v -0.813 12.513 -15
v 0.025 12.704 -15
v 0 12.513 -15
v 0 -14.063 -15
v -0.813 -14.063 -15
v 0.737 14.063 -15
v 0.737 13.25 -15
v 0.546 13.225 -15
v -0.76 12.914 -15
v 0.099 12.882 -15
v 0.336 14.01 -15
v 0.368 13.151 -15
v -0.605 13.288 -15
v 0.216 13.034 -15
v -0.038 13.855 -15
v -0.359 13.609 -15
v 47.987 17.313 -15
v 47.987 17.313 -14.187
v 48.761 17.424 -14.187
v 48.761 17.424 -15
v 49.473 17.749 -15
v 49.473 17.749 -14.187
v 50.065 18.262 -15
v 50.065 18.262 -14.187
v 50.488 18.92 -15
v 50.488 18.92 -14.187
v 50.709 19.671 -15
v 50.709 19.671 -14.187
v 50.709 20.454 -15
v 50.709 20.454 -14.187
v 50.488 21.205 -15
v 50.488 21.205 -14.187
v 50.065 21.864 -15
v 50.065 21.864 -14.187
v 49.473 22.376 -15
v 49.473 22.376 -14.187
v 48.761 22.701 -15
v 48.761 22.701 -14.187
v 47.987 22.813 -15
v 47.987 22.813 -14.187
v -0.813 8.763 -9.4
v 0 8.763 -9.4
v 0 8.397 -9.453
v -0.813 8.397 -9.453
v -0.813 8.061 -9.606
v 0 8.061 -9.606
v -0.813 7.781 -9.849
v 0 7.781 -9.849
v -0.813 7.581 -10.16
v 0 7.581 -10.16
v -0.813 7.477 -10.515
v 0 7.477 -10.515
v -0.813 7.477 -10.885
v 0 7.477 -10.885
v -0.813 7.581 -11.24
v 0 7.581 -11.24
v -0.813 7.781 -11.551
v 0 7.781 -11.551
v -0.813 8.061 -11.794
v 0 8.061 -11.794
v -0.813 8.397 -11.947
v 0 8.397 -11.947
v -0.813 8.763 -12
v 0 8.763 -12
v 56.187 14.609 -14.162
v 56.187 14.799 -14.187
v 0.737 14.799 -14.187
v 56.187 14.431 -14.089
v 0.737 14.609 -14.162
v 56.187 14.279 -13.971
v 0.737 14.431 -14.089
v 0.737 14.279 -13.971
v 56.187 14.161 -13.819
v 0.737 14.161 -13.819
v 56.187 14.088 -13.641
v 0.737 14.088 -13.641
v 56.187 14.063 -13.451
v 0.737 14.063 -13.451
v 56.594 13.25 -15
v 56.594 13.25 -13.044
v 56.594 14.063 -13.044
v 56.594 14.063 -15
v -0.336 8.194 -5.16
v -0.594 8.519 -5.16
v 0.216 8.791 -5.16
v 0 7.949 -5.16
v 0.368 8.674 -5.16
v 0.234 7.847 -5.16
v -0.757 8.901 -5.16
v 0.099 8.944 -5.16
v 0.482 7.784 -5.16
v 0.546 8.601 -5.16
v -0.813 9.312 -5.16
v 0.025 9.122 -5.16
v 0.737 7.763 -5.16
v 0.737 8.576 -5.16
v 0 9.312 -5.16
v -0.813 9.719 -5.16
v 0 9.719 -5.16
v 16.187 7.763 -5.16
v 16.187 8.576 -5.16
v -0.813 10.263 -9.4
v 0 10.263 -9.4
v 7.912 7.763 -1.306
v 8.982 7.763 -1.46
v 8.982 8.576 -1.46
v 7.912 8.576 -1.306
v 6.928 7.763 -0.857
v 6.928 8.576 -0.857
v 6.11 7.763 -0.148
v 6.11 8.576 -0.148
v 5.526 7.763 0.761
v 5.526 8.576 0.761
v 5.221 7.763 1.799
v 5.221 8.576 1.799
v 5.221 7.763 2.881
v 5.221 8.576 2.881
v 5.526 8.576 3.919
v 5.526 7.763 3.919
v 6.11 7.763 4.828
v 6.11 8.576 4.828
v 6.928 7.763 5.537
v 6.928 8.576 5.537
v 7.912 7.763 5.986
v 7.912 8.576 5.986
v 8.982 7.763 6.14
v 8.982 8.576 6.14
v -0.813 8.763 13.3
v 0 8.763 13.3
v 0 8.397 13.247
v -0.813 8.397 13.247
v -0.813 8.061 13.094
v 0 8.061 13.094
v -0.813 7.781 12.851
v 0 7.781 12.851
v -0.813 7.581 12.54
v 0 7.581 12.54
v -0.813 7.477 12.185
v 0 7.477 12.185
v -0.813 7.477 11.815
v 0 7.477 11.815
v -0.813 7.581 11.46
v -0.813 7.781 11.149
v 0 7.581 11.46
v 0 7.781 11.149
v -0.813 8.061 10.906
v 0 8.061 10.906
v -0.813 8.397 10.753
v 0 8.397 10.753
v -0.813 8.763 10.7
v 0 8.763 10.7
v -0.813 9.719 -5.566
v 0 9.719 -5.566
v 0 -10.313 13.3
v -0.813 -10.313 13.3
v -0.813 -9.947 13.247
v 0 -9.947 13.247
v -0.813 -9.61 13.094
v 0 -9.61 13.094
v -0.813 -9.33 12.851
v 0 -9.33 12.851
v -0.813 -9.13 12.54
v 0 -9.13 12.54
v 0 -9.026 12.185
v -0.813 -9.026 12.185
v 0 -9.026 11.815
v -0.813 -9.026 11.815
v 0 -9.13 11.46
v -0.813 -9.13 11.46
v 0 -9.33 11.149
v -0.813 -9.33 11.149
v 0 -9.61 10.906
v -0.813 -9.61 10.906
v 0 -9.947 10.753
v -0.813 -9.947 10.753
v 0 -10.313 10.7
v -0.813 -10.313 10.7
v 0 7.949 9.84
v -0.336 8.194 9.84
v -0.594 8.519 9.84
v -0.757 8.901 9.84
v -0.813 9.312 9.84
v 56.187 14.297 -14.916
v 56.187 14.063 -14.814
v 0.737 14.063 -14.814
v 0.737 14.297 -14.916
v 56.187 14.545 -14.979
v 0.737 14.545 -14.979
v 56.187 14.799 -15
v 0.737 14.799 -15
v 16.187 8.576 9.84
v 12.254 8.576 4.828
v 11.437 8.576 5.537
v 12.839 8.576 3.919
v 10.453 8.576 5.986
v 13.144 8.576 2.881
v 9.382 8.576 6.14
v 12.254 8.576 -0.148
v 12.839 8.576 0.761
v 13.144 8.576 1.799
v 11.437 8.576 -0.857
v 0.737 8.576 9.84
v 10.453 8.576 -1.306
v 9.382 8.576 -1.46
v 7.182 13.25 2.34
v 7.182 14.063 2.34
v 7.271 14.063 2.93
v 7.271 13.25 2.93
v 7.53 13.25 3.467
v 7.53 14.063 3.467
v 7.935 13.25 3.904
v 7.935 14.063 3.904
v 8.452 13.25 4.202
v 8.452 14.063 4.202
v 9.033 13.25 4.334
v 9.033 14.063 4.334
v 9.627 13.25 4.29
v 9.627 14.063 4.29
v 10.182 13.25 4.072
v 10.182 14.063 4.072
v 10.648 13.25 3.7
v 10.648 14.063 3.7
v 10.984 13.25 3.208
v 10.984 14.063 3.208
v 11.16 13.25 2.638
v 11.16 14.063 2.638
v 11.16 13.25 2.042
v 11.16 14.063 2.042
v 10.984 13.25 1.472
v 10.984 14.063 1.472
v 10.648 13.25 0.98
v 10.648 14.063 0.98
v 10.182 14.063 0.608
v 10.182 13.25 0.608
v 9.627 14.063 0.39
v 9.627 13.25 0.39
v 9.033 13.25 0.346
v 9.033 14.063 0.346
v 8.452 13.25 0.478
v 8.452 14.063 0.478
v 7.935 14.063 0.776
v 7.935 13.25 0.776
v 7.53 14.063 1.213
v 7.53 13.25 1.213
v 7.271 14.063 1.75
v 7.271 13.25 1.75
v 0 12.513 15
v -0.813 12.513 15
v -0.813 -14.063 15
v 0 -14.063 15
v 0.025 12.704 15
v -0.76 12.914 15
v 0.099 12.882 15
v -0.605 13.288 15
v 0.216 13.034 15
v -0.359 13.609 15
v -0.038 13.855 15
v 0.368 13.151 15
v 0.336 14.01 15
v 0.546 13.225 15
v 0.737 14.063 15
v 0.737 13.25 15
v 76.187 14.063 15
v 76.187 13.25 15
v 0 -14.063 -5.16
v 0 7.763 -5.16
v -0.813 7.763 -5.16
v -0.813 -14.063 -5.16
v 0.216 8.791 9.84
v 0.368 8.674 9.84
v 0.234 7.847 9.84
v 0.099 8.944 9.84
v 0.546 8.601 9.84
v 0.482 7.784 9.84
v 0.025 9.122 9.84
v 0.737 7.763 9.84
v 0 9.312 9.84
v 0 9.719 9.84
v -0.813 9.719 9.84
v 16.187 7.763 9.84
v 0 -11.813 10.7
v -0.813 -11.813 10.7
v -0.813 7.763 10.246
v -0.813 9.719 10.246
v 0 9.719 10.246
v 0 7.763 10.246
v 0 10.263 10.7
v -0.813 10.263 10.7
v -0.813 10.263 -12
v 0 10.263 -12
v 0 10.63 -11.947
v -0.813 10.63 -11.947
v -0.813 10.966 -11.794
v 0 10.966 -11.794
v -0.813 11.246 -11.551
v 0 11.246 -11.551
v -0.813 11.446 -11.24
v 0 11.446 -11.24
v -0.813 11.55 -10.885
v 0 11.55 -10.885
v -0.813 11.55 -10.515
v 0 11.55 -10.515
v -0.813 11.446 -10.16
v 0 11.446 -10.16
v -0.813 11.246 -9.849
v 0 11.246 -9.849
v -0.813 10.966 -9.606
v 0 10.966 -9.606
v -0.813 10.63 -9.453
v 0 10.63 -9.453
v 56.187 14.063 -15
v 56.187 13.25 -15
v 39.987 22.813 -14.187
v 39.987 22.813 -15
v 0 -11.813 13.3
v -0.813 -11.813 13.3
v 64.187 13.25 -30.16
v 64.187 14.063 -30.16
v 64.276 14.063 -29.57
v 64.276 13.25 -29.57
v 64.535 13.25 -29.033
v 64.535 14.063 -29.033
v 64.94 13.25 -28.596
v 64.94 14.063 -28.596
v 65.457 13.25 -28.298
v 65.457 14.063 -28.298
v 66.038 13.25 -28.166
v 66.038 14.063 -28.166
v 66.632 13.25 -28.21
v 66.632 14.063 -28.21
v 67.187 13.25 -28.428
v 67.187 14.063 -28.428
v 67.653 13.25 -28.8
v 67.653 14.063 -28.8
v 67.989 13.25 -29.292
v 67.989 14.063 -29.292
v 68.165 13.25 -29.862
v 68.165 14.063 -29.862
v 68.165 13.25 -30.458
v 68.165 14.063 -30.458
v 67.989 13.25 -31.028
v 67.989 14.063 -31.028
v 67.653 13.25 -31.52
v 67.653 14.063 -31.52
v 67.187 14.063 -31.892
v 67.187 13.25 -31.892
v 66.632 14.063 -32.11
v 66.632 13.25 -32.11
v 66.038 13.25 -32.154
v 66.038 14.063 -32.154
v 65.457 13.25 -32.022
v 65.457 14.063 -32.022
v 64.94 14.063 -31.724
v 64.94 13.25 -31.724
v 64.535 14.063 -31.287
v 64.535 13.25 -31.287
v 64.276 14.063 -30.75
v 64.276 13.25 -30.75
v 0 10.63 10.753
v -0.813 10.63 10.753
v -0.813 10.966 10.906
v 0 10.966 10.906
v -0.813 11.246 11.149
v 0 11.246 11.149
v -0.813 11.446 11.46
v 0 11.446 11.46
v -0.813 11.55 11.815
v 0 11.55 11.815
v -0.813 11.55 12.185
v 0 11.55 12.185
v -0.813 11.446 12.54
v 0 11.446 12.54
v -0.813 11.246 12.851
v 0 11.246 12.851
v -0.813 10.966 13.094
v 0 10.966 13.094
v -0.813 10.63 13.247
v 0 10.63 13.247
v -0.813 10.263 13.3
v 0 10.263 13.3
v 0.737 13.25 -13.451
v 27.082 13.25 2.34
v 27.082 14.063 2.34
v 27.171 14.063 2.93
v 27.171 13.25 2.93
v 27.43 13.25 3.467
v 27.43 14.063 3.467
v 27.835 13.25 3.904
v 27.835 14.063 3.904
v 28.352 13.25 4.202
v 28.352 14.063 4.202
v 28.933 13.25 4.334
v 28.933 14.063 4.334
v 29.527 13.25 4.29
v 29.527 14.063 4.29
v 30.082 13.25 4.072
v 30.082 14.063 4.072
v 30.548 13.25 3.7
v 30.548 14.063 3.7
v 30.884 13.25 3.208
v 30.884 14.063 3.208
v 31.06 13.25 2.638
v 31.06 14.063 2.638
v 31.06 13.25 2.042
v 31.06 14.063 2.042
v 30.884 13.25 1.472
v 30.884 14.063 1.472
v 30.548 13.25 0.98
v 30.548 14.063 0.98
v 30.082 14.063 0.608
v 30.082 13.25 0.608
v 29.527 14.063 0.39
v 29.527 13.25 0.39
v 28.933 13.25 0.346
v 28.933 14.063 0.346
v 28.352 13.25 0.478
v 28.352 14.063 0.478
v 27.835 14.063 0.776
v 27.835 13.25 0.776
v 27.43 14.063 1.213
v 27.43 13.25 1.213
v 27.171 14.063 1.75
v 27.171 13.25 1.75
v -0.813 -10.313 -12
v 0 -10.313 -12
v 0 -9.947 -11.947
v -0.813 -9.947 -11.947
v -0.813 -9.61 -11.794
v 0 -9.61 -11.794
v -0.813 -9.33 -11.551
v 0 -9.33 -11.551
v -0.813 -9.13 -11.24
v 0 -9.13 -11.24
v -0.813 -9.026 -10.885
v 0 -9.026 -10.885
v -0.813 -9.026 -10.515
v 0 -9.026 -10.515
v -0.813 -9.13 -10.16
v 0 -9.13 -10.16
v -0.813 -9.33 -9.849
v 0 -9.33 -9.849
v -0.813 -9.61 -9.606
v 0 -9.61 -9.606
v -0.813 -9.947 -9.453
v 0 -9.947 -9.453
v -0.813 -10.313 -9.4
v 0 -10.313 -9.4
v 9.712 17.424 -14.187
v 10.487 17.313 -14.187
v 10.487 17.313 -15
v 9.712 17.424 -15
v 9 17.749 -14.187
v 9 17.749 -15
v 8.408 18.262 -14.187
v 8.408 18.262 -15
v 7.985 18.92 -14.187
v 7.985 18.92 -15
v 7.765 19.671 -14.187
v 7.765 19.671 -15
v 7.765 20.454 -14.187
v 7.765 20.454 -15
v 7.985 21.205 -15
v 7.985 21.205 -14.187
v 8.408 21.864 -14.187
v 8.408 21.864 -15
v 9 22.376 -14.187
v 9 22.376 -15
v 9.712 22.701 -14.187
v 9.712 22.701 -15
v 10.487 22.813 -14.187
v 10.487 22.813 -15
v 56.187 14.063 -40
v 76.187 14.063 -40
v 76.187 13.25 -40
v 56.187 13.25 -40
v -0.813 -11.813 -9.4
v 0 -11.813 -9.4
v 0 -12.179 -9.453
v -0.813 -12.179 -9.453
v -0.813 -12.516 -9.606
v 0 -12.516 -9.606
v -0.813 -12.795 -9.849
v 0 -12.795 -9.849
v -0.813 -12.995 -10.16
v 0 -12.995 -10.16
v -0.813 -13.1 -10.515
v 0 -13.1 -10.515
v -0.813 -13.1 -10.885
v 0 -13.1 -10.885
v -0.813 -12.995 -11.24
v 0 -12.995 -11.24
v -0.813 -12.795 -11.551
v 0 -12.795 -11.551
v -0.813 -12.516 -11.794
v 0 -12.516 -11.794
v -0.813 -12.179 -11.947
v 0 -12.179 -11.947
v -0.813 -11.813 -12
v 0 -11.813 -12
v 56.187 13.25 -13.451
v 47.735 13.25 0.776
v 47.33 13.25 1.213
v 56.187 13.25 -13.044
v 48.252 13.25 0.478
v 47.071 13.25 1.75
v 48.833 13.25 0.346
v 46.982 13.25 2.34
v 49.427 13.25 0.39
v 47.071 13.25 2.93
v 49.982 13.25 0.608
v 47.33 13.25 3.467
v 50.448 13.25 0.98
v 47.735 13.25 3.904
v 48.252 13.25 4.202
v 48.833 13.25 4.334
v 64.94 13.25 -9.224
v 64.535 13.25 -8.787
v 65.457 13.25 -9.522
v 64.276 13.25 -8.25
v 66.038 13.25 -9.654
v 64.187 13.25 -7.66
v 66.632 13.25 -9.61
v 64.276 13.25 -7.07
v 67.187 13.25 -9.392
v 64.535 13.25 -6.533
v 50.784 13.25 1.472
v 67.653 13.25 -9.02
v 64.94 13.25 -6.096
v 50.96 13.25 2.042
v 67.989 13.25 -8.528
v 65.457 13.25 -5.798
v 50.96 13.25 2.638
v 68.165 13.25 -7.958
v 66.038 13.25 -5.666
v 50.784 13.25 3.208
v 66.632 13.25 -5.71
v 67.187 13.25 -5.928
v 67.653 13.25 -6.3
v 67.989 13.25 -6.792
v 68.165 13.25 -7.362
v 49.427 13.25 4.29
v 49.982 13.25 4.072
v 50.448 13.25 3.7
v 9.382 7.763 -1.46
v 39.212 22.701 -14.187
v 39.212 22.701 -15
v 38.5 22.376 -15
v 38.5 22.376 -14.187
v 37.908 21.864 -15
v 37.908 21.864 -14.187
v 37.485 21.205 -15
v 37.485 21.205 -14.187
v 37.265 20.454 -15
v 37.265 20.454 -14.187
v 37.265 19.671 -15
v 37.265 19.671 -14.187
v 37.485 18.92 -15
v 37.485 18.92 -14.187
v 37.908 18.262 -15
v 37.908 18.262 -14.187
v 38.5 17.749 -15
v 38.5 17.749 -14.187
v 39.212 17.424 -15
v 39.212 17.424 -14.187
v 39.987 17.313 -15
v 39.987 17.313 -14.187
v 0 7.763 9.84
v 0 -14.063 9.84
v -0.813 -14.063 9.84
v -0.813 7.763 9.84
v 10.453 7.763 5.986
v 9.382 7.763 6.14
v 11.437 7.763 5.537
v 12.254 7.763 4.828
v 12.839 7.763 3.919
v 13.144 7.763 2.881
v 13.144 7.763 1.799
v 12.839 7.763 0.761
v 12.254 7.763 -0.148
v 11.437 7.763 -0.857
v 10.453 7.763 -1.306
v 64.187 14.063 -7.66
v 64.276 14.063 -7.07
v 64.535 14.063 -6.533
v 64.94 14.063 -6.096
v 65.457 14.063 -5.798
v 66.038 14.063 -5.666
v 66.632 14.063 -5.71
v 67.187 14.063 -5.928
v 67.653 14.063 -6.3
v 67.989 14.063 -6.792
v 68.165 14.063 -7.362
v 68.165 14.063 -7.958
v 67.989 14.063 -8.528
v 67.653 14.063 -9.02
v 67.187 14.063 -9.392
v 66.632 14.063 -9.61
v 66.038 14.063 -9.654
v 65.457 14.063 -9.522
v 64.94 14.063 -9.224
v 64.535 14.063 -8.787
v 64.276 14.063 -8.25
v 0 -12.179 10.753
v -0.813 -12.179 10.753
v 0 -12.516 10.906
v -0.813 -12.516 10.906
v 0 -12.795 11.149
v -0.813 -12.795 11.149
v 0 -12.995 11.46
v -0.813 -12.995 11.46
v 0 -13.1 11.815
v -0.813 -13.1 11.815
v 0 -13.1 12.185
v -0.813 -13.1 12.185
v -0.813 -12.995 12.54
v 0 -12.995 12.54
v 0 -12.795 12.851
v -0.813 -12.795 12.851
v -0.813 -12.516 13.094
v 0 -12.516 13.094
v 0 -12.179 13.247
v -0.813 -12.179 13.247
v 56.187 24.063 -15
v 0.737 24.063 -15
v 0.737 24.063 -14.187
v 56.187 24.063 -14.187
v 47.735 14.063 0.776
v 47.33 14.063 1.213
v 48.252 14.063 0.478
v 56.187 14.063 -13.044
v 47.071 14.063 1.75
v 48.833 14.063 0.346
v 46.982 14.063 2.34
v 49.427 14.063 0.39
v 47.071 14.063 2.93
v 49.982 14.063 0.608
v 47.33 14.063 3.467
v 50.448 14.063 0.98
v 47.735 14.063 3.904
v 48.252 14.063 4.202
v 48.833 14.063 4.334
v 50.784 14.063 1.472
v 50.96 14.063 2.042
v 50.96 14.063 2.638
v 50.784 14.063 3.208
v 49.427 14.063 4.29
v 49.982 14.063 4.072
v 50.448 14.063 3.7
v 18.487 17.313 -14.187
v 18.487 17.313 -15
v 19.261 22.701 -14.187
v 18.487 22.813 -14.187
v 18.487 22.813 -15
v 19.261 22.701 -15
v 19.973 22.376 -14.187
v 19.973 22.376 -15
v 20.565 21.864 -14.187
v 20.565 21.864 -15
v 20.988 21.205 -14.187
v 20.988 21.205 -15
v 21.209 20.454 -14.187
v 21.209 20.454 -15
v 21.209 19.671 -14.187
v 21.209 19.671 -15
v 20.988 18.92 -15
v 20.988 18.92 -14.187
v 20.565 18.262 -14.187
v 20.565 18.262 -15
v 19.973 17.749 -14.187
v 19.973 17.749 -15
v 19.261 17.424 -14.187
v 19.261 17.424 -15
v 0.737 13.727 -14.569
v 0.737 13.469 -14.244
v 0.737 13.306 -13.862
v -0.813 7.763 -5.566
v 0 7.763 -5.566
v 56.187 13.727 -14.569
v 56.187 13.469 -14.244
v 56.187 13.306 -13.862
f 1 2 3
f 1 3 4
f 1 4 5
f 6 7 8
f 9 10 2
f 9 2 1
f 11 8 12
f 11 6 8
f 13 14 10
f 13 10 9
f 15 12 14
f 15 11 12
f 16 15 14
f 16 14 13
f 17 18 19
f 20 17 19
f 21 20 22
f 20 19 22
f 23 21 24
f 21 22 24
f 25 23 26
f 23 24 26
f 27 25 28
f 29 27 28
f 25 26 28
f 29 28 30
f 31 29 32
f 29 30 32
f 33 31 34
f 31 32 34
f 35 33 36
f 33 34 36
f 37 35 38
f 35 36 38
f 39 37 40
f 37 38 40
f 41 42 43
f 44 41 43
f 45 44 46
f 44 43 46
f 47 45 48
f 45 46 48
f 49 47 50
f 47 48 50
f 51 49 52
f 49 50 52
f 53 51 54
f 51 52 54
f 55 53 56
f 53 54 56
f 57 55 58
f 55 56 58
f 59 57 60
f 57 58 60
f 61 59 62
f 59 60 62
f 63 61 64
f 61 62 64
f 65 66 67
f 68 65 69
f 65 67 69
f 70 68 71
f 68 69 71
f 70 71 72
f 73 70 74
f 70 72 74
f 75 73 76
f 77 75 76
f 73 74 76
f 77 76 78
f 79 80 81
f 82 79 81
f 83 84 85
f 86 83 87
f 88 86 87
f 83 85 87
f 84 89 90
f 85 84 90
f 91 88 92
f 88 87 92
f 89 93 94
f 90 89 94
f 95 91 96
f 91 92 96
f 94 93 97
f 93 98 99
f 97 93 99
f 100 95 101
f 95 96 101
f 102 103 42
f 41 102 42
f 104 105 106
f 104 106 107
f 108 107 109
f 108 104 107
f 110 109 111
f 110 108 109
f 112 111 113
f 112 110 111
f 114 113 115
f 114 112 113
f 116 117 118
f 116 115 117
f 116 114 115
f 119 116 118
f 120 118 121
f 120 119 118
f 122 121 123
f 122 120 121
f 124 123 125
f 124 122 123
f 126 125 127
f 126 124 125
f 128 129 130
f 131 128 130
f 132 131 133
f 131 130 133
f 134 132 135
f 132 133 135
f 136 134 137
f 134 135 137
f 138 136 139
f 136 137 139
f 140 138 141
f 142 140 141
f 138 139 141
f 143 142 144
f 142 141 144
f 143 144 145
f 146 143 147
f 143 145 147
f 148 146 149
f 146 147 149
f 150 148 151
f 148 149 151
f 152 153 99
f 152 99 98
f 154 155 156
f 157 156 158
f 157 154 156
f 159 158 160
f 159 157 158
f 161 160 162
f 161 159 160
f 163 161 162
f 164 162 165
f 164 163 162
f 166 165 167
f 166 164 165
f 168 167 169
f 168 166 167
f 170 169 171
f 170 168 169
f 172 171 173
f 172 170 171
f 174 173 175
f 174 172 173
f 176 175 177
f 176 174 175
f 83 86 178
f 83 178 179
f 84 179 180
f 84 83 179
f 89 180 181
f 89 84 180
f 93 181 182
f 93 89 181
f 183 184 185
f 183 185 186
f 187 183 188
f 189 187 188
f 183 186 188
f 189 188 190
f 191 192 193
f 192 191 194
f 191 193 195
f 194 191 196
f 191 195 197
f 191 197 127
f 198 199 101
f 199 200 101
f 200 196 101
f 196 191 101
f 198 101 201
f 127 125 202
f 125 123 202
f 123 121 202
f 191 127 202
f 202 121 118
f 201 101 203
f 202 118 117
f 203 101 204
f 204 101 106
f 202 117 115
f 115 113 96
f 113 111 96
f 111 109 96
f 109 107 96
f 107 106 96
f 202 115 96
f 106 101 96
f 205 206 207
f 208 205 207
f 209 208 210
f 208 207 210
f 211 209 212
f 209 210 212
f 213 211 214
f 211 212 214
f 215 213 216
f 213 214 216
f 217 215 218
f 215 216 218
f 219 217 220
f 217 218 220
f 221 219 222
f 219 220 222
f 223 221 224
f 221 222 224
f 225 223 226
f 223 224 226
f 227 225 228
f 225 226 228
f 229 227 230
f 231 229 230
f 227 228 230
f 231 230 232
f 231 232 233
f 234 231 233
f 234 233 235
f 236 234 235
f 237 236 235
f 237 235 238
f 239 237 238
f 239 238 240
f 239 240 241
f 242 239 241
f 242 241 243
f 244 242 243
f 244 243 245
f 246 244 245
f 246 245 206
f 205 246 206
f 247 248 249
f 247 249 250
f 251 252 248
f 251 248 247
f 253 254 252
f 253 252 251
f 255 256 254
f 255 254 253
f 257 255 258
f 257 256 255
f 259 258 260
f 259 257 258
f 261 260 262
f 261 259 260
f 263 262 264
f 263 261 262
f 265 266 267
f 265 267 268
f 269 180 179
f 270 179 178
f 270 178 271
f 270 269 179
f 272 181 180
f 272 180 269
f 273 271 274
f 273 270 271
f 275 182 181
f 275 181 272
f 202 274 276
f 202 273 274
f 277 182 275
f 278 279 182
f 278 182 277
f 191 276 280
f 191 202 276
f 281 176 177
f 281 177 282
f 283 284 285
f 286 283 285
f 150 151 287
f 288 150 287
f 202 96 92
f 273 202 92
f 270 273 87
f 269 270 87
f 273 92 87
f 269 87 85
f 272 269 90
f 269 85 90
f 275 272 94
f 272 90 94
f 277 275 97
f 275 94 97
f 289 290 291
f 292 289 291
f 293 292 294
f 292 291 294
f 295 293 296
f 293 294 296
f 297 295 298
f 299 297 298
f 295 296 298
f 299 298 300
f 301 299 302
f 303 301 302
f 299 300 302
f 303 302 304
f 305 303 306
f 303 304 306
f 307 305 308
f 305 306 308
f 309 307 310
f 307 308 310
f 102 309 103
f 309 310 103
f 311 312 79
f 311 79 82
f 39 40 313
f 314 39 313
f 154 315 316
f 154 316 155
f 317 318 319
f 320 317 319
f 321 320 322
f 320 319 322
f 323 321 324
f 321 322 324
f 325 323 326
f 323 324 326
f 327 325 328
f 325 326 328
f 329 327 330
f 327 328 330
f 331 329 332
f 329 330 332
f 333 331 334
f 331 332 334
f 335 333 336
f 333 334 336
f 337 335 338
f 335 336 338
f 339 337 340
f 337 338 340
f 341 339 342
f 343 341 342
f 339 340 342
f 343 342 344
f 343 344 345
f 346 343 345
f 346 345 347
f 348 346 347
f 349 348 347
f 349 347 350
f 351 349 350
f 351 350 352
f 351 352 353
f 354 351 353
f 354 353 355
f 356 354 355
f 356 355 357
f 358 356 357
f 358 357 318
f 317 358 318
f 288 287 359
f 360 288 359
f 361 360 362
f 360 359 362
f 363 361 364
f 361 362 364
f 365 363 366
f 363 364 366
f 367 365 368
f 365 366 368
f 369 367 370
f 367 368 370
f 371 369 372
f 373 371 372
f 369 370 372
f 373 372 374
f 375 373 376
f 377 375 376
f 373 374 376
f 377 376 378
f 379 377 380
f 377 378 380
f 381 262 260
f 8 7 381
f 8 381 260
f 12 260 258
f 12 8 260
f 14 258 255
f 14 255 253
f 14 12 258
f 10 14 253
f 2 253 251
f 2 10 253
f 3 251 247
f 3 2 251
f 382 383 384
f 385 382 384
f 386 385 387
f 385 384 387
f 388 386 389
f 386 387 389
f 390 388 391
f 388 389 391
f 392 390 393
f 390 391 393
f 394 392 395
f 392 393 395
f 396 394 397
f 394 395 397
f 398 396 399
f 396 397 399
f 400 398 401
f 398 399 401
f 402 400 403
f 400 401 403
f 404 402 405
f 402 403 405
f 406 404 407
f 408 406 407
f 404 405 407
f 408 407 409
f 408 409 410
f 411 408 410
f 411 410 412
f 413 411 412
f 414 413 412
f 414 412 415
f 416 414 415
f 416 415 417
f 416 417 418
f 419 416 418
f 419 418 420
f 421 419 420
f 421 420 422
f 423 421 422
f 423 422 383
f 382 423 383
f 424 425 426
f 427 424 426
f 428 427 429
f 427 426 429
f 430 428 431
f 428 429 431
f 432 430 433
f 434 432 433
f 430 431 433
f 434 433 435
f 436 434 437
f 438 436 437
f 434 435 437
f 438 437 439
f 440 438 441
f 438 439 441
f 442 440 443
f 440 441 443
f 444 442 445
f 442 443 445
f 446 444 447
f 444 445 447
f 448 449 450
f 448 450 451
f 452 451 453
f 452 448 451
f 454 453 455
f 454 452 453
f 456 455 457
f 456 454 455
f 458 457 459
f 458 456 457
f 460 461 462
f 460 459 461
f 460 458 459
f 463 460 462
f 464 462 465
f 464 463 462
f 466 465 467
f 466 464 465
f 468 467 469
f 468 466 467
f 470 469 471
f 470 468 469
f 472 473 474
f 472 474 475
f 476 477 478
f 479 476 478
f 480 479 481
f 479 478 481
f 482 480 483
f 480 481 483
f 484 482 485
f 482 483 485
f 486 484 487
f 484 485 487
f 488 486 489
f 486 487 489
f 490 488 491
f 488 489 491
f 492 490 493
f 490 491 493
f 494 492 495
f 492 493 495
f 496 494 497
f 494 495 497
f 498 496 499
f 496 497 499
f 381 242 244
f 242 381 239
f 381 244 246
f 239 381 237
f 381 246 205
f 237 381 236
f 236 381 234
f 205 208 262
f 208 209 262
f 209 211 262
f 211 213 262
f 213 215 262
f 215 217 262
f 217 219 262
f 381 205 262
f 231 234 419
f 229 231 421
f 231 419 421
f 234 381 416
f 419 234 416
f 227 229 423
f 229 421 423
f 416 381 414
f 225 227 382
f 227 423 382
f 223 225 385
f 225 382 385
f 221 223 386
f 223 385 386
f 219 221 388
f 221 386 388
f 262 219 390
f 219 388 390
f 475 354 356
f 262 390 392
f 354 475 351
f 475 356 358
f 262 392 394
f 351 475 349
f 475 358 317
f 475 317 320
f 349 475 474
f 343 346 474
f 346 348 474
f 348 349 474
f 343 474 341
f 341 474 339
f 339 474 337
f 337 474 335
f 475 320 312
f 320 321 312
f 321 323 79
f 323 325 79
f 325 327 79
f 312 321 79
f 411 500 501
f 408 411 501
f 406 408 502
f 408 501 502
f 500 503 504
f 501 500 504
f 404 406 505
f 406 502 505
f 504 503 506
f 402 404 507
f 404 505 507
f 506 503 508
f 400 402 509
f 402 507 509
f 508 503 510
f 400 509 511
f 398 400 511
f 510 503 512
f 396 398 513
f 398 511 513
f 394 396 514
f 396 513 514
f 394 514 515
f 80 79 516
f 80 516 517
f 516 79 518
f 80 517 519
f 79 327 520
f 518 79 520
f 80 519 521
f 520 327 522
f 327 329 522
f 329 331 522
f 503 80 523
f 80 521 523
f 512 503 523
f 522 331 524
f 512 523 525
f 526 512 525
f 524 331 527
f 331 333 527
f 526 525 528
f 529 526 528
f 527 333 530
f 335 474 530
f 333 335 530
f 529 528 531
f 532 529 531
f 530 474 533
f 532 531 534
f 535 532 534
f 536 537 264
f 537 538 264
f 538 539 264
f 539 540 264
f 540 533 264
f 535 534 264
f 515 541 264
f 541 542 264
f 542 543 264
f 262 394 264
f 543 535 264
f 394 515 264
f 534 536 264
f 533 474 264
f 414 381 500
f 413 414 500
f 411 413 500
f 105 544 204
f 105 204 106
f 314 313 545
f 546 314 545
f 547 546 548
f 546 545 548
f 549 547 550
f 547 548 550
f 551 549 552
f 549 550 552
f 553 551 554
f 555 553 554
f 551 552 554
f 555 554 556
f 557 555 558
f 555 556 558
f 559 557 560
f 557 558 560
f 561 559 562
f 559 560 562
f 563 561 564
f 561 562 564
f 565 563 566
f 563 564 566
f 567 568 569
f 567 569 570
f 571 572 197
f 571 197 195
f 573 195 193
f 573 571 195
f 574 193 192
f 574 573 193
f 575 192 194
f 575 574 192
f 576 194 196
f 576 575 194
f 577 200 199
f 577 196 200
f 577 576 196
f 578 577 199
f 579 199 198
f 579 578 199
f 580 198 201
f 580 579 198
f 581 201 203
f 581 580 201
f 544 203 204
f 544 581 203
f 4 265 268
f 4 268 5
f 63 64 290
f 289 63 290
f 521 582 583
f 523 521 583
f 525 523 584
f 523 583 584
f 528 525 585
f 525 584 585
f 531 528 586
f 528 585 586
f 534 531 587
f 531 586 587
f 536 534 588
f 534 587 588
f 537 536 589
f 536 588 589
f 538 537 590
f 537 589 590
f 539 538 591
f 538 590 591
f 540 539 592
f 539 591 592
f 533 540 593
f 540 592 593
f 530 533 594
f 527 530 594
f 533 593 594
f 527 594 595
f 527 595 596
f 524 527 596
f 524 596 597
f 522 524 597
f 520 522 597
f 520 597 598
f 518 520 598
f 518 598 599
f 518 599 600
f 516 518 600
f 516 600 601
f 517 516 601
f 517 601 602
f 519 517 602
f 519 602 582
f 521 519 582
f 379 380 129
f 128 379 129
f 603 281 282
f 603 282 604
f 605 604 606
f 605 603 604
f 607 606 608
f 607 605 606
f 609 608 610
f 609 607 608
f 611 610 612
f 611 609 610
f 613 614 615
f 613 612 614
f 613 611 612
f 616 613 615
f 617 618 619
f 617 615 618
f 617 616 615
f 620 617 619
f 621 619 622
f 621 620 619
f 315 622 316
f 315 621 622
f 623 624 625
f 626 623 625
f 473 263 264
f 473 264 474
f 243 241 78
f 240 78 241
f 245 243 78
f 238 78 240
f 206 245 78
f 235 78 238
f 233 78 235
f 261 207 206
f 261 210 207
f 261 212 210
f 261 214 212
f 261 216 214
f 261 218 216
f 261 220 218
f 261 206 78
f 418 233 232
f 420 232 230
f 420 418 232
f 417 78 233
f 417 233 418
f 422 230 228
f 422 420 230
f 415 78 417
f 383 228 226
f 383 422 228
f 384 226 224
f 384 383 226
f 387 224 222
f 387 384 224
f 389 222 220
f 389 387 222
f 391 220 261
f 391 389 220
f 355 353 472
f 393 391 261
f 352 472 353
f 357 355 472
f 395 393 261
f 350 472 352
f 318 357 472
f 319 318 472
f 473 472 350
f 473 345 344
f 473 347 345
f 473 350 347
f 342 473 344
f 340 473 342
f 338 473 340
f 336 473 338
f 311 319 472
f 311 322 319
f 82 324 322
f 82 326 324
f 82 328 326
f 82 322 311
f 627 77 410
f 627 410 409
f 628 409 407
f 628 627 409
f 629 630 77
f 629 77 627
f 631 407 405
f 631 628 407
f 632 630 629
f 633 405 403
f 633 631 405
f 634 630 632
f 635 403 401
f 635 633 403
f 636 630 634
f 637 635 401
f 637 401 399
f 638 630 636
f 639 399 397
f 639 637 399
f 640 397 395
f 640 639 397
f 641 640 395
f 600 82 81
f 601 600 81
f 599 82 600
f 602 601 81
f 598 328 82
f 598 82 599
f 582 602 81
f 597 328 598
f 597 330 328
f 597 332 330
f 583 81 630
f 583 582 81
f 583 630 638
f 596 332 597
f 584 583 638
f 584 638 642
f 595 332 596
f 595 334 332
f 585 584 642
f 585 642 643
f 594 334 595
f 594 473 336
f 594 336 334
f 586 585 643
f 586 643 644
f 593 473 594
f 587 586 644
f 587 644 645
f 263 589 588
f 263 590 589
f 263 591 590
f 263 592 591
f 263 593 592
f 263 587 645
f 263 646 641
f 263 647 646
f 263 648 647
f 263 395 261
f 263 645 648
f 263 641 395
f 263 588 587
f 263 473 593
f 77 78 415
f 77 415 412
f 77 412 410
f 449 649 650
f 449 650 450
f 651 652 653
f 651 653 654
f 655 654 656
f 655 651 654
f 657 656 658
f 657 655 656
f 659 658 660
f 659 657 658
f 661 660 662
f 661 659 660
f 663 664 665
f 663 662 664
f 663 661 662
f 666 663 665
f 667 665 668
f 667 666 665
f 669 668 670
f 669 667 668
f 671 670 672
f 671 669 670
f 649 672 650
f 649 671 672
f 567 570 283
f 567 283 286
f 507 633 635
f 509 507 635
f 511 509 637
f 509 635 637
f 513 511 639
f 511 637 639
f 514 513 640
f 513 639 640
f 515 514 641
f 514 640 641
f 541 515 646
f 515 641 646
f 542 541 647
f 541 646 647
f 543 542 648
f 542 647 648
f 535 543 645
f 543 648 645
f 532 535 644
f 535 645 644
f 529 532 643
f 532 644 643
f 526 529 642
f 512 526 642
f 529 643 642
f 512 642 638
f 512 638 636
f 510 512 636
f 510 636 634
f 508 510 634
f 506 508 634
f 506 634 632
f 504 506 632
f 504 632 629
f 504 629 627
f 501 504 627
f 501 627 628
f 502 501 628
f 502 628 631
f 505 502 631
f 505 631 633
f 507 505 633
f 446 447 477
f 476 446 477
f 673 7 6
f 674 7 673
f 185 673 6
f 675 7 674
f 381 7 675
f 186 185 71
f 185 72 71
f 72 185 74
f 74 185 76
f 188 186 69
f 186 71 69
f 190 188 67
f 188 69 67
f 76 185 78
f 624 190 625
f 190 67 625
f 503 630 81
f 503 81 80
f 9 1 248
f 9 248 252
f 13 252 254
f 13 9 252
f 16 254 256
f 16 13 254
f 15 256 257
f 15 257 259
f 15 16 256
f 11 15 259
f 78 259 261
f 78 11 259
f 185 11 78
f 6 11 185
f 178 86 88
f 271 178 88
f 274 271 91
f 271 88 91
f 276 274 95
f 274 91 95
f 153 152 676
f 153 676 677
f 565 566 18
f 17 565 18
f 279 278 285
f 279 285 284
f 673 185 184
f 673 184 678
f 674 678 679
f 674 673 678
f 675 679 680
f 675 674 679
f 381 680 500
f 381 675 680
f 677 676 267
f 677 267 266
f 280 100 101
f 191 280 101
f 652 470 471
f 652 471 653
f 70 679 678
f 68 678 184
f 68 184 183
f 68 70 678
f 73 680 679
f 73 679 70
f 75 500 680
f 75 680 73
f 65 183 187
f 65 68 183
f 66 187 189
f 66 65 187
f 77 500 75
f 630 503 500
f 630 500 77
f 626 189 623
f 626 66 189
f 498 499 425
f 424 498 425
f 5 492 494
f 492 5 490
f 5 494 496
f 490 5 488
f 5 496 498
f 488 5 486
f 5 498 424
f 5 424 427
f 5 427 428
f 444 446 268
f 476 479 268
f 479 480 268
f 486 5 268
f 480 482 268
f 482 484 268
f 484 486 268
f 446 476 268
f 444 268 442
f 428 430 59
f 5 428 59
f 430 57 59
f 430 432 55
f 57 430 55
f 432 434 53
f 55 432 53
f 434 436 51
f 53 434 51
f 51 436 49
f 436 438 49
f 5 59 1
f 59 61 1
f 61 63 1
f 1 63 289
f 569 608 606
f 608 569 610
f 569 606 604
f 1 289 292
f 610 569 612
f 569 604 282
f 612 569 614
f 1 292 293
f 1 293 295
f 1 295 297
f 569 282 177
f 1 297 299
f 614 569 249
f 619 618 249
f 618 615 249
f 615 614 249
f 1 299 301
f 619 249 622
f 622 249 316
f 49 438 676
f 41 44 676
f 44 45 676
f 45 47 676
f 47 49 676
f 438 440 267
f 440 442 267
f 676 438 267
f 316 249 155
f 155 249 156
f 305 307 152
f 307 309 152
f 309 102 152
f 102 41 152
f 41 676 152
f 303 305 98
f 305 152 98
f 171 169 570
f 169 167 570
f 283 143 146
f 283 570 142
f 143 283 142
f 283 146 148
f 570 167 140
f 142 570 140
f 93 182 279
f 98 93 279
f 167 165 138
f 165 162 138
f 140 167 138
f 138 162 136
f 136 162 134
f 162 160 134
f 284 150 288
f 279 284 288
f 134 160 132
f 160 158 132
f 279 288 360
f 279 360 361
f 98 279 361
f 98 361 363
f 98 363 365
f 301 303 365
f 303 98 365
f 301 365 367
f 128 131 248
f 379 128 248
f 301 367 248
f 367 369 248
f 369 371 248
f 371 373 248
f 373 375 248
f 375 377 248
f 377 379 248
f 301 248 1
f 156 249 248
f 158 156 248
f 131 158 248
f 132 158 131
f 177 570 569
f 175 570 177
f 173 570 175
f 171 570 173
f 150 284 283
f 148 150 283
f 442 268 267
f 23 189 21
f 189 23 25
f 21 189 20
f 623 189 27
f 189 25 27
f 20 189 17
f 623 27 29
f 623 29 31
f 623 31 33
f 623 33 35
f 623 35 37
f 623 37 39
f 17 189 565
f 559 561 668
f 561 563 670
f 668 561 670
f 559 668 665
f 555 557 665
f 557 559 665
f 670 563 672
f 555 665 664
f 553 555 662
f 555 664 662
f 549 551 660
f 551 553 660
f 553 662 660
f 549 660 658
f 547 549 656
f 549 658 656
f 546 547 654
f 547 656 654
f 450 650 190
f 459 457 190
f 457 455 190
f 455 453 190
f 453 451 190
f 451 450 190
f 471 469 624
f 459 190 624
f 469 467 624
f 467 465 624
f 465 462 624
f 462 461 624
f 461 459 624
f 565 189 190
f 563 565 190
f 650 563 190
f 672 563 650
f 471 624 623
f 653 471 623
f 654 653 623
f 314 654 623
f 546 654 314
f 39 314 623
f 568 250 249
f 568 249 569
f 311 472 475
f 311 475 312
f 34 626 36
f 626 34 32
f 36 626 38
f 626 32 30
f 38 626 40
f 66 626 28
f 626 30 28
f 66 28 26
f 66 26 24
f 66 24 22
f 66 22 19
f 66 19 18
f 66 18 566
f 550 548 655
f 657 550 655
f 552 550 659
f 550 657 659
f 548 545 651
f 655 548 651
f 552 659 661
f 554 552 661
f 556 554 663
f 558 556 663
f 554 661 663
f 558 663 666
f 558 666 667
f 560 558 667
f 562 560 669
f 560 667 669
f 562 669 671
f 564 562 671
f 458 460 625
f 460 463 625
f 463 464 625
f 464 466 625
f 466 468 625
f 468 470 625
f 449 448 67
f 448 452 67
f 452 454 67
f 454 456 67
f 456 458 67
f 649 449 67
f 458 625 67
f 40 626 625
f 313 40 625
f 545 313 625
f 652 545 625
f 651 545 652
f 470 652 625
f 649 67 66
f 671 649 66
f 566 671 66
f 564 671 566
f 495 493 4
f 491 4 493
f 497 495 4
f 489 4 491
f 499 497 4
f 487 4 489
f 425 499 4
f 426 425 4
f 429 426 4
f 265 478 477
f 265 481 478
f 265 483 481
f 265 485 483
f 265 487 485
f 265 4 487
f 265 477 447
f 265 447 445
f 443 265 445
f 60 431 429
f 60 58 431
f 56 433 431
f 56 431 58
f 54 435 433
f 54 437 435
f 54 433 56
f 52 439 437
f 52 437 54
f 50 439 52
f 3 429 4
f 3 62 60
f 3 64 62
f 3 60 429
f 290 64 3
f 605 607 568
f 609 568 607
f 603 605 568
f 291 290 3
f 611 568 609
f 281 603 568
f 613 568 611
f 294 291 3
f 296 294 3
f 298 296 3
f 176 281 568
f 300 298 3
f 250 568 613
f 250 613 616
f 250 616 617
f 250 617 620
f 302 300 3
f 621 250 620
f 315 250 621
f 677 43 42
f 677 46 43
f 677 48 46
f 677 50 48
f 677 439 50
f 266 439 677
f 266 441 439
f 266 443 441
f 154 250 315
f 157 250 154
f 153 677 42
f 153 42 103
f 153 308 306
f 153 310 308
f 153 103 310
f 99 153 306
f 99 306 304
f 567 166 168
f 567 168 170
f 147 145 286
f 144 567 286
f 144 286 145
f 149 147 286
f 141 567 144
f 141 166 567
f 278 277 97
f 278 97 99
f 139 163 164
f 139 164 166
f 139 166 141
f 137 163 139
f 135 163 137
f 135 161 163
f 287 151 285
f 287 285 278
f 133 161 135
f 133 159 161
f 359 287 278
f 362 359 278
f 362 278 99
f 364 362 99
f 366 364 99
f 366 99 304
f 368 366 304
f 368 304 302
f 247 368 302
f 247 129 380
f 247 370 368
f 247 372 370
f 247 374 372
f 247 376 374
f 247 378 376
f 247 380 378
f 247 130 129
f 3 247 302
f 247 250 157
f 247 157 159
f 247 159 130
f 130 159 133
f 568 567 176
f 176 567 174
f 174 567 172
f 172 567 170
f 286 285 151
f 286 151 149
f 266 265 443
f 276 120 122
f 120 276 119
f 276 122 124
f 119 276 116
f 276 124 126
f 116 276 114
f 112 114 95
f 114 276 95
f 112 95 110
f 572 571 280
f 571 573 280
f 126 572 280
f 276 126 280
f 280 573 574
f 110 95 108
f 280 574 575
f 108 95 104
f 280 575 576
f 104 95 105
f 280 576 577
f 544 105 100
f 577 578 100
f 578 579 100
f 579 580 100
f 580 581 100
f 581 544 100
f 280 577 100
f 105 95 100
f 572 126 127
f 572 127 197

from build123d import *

# Parameters (mm, degrees)
BASE_FLANGE2_DEPTH           = 0.8128
EDGE_FLANGE1_STRIP_W         = 4.7244
EDGE_FLANGE1_STRIP_H         = 0.8128
EDGE_FLANGE1_STRIP_CUT_DEPTH = 30
EDGE_FLANGE1_DEPTH           = 30
EDGE_FLANGE1_FLAT_DEPTH      = 0.8128
EDGE_FLANGE3_START           = 0.7366
EDGE_FLANGE3_DEPTH           = 55.857
EDGE_FLANGE3_START_2         = 56.1872
EDGE_FLANGE3_2_DEPTH         = 0.4064
EDGE_FLANGE3_3_DEPTH         = 55.4506
CUT_EXTRUDE1_REACH           = 92.529
SKETCH21_R                   = 2
CUT_EXTRUDE2_REACH           = 87.061
EDGE_FLANGE4_START           = -5.5664
EDGE_FLANGE4_DEPTH           = 15.8128
EDGE_FLANGE4_2_DEPTH         = 0.4064
EDGE_FLANGE4_START_2         = 9.84
EDGE_FLANGE4_3_DEPTH         = 0.4064
EDGE_FLANGE4_START_3         = -5.16
EDGE_FLANGE4_4_DEPTH         = 15
CUT_EXTRUDE3_REACH           = 90.774
CUT_EXTRUDE4_REACH           = 91.35


# Read off the part's stored shape, not the designer's step: Edge-Flange3, Edge-Flange4
# Sheet-metal steps are written as plain solids
with BuildPart() as part:
    # Sketch7 → Base-Flange2 (new body)
    with BuildSketch(Plane.YZ):
        Polygon((-14.0628, 9.84), (7.7628, 9.84), (7.7628, -5.16), (-14.0628, -5.16), (-14.0628, -15), (14.0628, -15), (14.0628, 15), (-14.0628, 15), align=None)
    extrude(amount=-BASE_FLANGE2_DEPTH)

    # Edge-Flange1 strip (across the edge) → Edge-Flange1 strip cut (cut)
    with BuildSketch(Plane(origin=(0, 14.0628, -15), x_dir=(0, -1, 0), z_dir=(0, 0, 1))):
        with Locations((-0.8128, -0.4064)):
            Rectangle(EDGE_FLANGE1_STRIP_W, EDGE_FLANGE1_STRIP_H)
    extrude(amount=EDGE_FLANGE1_STRIP_CUT_DEPTH, mode=Mode.SUBTRACT)

    # Edge-Flange1 bend section (across the edge) → Edge-Flange1 (add)
    with BuildSketch(Plane(origin=(0, 14.0628, -15), x_dir=(0, -1, 0), z_dir=(0, 0, 1))):
        with BuildLine():
            Line((0, 0.7366), (0.8128, 0.7366))
            ThreePointArc((0.8128, 0.7366), (1.028545145, 0.215745145), (1.5494, 0))
            Line((1.5494, 0), (1.5494, -0.8128))
            ThreePointArc((1.5494, -0.8128), (0.453808753, -0.358991247), (0, 0.7366))
        make_face()
    extrude(amount=EDGE_FLANGE1_DEPTH)

    # Edge-Flange1 profile (on flange) → Edge-Flange1 flat (add)
    with BuildSketch(Plane.ZX.offset(14.0628)):
        Polygon((-40, 56.1872), (-15, 56.1872), (-15, 0.7366), (15, 0.7366), (15, 76.1872), (-40, 76.1872), align=None)
    extrude(amount=-EDGE_FLANGE1_FLAT_DEPTH)

    # Edge-Flange3 outline → Edge-Flange3 (cut)
    with BuildSketch(Plane.YZ.offset(EDGE_FLANGE3_START)):
        with BuildLine():
            Line((14.0628, -15), (14.0628, -14.813707039))
            ThreePointArc((14.0628, -14.813707039), (13.468624211, -14.244121367), (13.25, -13.4506))
            Line((13.25, -13.4506), (13.25, -15))
            Line((13.25, -15), (14.0628, -15))
        make_face()
    extrude(amount=EDGE_FLANGE3_DEPTH, mode=Mode.SUBTRACT)

    # Edge-Flange3 2 outline → Edge-Flange3 2 (cut)
    with BuildSketch(Plane.YZ.offset(EDGE_FLANGE3_START_2)):
        with BuildLine():
            ThreePointArc((13.25, -13.4506), (13.468624211, -14.244121367), (14.0628, -14.813707039))
            Line((14.0628, -14.813707039), (14.0628, -13.0442))
            Line((14.0628, -13.0442), (13.25, -13.0442))
            Line((13.25, -13.0442), (13.25, -13.4506))
        make_face()
    extrude(amount=EDGE_FLANGE3_2_DEPTH, mode=Mode.SUBTRACT)

    # Edge-Flange3 3 outline → Edge-Flange3 3 (add)
    with BuildSketch(Plane.YZ.offset(EDGE_FLANGE3_START)):
        with BuildLine():
            Line((14.7994, -15), (24.0628, -15))
            Line((24.0628, -15), (24.0628, -14.1872))
            Line((24.0628, -14.1872), (14.7994, -14.1872))
            ThreePointArc((14.7994, -14.1872), (14.278545145, -13.971454855), (14.0628, -13.4506))
            Line((14.0628, -13.4506), (14.0628, -14.813707039))
            ThreePointArc((14.0628, -14.813707039), (14.419503755, -14.952704924), (14.7994, -15))
        make_face()
    extrude(amount=EDGE_FLANGE3_3_DEPTH)

    # Sketch21 → Cut-Extrude1 (cut, up to next)
    with BuildSketch(Plane(origin=(0, 14.0628, 0), x_dir=(-1, 0, 0), z_dir=(0, 1, 0)), mode=Mode.PRIVATE) as cut_extrude1_sk1:
        with Locations((-66.1872, -30.16)):
            Circle(SKETCH21_R)
    cut_extrude1_tool1 = extrude(cut_extrude1_sk1.sketch, amount=-CUT_EXTRUDE1_REACH, mode=Mode.PRIVATE) & part.part
    # Sketch21 → Cut-Extrude1 (cut, up to next)
    with BuildSketch(Plane(origin=(0, 14.0628, 0), x_dir=(-1, 0, 0), z_dir=(0, 1, 0)), mode=Mode.PRIVATE) as cut_extrude1_sk2:
        with Locations((-66.1872, -7.66)):
            Circle(SKETCH21_R)
    cut_extrude1_tool2 = extrude(cut_extrude1_sk2.sketch, amount=-CUT_EXTRUDE1_REACH, mode=Mode.PRIVATE) & part.part
    # Sketch21 → Cut-Extrude1 (cut, up to next)
    with BuildSketch(Plane(origin=(0, 14.0628, 0), x_dir=(-1, 0, 0), z_dir=(0, 1, 0)), mode=Mode.PRIVATE) as cut_extrude1_sk3:
        with Locations((-48.982258849, 2.34)):
            Circle(SKETCH21_R)
    cut_extrude1_tool3 = extrude(cut_extrude1_sk3.sketch, amount=-CUT_EXTRUDE1_REACH, mode=Mode.PRIVATE) & part.part
    # Sketch21 → Cut-Extrude1 (cut, up to next)
    with BuildSketch(Plane(origin=(0, 14.0628, 0), x_dir=(-1, 0, 0), z_dir=(0, 1, 0)), mode=Mode.PRIVATE) as cut_extrude1_sk4:
        with Locations((-29.082258849, 2.34)):
            Circle(SKETCH21_R)
    cut_extrude1_tool4 = extrude(cut_extrude1_sk4.sketch, amount=-CUT_EXTRUDE1_REACH, mode=Mode.PRIVATE) & part.part
    # Sketch21 → Cut-Extrude1 (cut, up to next)
    with BuildSketch(Plane(origin=(0, 14.0628, 0), x_dir=(-1, 0, 0), z_dir=(0, 1, 0)), mode=Mode.PRIVATE) as cut_extrude1_sk5:
        with Locations((-9.182258849, 2.34)):
            Circle(SKETCH21_R)
    cut_extrude1_tool5 = extrude(cut_extrude1_sk5.sketch, amount=-CUT_EXTRUDE1_REACH, mode=Mode.PRIVATE) & part.part
    add(cut_extrude1_tool1.solids().sort_by_distance((66.1872, 14.0628, -30.16))[0], mode=Mode.SUBTRACT)
    add(cut_extrude1_tool2.solids().sort_by_distance((66.1872, 14.0628, -7.66))[0], mode=Mode.SUBTRACT)
    add(cut_extrude1_tool3.solids().sort_by_distance((48.982259, 14.0628, 2.34))[0], mode=Mode.SUBTRACT)
    add(cut_extrude1_tool4.solids().sort_by_distance((29.082259, 14.0628, 2.34))[0], mode=Mode.SUBTRACT)
    add(cut_extrude1_tool5.solids().sort_by_distance((9.182259, 14.0628, 2.34))[0], mode=Mode.SUBTRACT)

    # Sketch22 → Cut-Extrude2 (cut, up to next)
    with BuildSketch(Plane.XY.offset(-14.1872), mode=Mode.PRIVATE) as cut_extrude2_sk1:
        with BuildLine():
            Line((10.4866, 22.8128), (18.4866, 22.8128))
            ThreePointArc((18.4866, 22.8128), (21.2366, 20.0628), (18.4866, 17.3128))
            Line((18.4866, 17.3128), (10.4866, 17.3128))
            ThreePointArc((10.4866, 17.3128), (7.7366, 20.0628), (10.4866, 22.8128))
        make_face()
    cut_extrude2_tool1 = extrude(cut_extrude2_sk1.sketch, amount=-CUT_EXTRUDE2_REACH, mode=Mode.PRIVATE) & part.part
    # Sketch22 → Cut-Extrude2 (cut, up to next)
    with BuildSketch(Plane.XY.offset(-14.1872), mode=Mode.PRIVATE) as cut_extrude2_sk2:
        with BuildLine():
            Line((47.9866, 22.8128), (39.9866, 22.8128))
            ThreePointArc((39.9866, 22.8128), (37.2366, 20.0628), (39.9866, 17.3128))
            Line((39.9866, 17.3128), (47.9866, 17.3128))
            ThreePointArc((47.9866, 17.3128), (50.7366, 20.0628), (47.9866, 22.8128))
        make_face()
    cut_extrude2_tool2 = extrude(cut_extrude2_sk2.sketch, amount=-CUT_EXTRUDE2_REACH, mode=Mode.PRIVATE) & part.part
    add(cut_extrude2_tool1.solids().sort_by_distance((14.4866, 20.0628, -14.1872))[0], mode=Mode.SUBTRACT)
    add(cut_extrude2_tool2.solids().sort_by_distance((43.9866, 20.0628, -14.1872))[0], mode=Mode.SUBTRACT)

    # Edge-Flange4 outline → Edge-Flange4 (cut)
    with BuildSketch(Plane.XY.offset(EDGE_FLANGE4_START)):
        with BuildLine():
            ThreePointArc((0, 7.949092961), (-0.594175789, 8.518678633), (-0.8128, 9.3122))
            Line((-0.8128, 9.3122), (-0.8128, 7.7628))
            Line((-0.8128, 7.7628), (0, 7.7628))
            Line((0, 7.7628), (0, 7.949092961))
        make_face()
    extrude(amount=EDGE_FLANGE4_DEPTH, mode=Mode.SUBTRACT)

    # Edge-Flange4 2 outline → Edge-Flange4 2 (cut)
    with BuildSketch(Plane.XY.offset(EDGE_FLANGE4_START)):
        with BuildLine():
            Line((0, 9.7186), (-0.8128, 9.7186))
            Line((-0.8128, 9.7186), (-0.8128, 9.3122))
            ThreePointArc((-0.8128, 9.3122), (-0.594175789, 8.518678633), (0, 7.949092961))
            Line((0, 7.949092961), (0, 9.7186))
        make_face()
    extrude(amount=EDGE_FLANGE4_2_DEPTH, mode=Mode.SUBTRACT)

    # Edge-Flange4 3 outline → Edge-Flange4 3 (cut)
    with BuildSketch(Plane.XY.offset(EDGE_FLANGE4_START_2)):
        with BuildLine():
            Line((0, 9.7186), (-0.8128, 9.7186))
            Line((-0.8128, 9.7186), (-0.8128, 9.3122))
            ThreePointArc((-0.8128, 9.3122), (-0.594175789, 8.518678633), (0, 7.949092961))
            Line((0, 7.949092961), (0, 9.7186))
        make_face()
    extrude(amount=EDGE_FLANGE4_3_DEPTH, mode=Mode.SUBTRACT)

    # Edge-Flange4 4 outline → Edge-Flange4 4 (add)
    with BuildSketch(Plane.XY.offset(EDGE_FLANGE4_START_3)):
        with BuildLine():
            ThreePointArc((0.7366, 8.5756), (0.215745145, 8.791345145), (0, 9.3122))
            Line((0, 9.3122), (0, 7.949092961))
            ThreePointArc((0, 7.949092961), (0.356703755, 7.810095076), (0.7366, 7.7628))
            Line((0.7366, 7.7628), (16.1872, 7.7628))
            Line((16.1872, 7.7628), (16.1872, 8.5756))
            Line((16.1872, 8.5756), (0.7366, 8.5756))
        make_face()
    extrude(amount=EDGE_FLANGE4_4_DEPTH)

    # Sketch27 → Cut-Extrude3 (cut, up to next)
    with BuildSketch(Plane.XZ.offset(-7.7628), mode=Mode.PRIVATE) as cut_extrude3_sk1:
        with BuildLine():
            Line((9.382258849, -1.46), (8.982258849, -1.46))
            ThreePointArc((8.982258849, -1.46), (5.182258849, 2.34), (8.982258849, 6.14))
            Line((8.982258849, 6.14), (9.382258849, 6.14))
            ThreePointArc((9.382258849, 6.14), (13.182258849, 2.34), (9.382258849, -1.46))
        make_face()
    cut_extrude3_tool1 = extrude(cut_extrude3_sk1.sketch, amount=-CUT_EXTRUDE3_REACH, mode=Mode.PRIVATE) & part.part
    add(cut_extrude3_tool1.solids().sort_by_distance((9.182259, 7.7628, 2.34))[0], mode=Mode.SUBTRACT)

    # Sketch33 → Cut-Extrude4 (cut, up to next)
    with BuildSketch(Plane.YZ, mode=Mode.PRIVATE) as cut_extrude4_sk1:
        with BuildLine():
            Line((-11.8128, 13.3), (-10.3128, 13.3))
            ThreePointArc((-10.3128, 13.3), (-9.0128, 12), (-10.3128, 10.7))
            Line((-10.3128, 10.7), (-11.8128, 10.7))
            ThreePointArc((-11.8128, 10.7), (-13.1128, 12), (-11.8128, 13.3))
        make_face()
    cut_extrude4_tool1 = extrude(cut_extrude4_sk1.sketch, amount=-CUT_EXTRUDE4_REACH, mode=Mode.PRIVATE) & part.part
    # Sketch33 → Cut-Extrude4 (cut, up to next)
    with BuildSketch(Plane.YZ, mode=Mode.PRIVATE) as cut_extrude4_sk2:
        with BuildLine():
            Line((8.7634, 10.7), (10.2634, 10.7))
            ThreePointArc((10.2634, 10.7), (11.5634, 12), (10.2634, 13.3))
            Line((10.2634, 13.3), (8.7634, 13.3))
            ThreePointArc((8.7634, 13.3), (7.4634, 12), (8.7634, 10.7))
        make_face()
    cut_extrude4_tool2 = extrude(cut_extrude4_sk2.sketch, amount=-CUT_EXTRUDE4_REACH, mode=Mode.PRIVATE) & part.part
    # Sketch33 → Cut-Extrude4 (cut, up to next)
    with BuildSketch(Plane.YZ, mode=Mode.PRIVATE) as cut_extrude4_sk3:
        with BuildLine():
            Line((8.7634, -12), (10.2634, -12))
            ThreePointArc((10.2634, -12), (11.5634, -10.7), (10.2634, -9.4))
            Line((10.2634, -9.4), (8.7634, -9.4))
            ThreePointArc((8.7634, -9.4), (7.4634, -10.7), (8.7634, -12))
        make_face()
    cut_extrude4_tool3 = extrude(cut_extrude4_sk3.sketch, amount=-CUT_EXTRUDE4_REACH, mode=Mode.PRIVATE) & part.part
    # Sketch33 → Cut-Extrude4 (cut, up to next)
    with BuildSketch(Plane.YZ, mode=Mode.PRIVATE) as cut_extrude4_sk4:
        with BuildLine():
            Line((-11.8128, -12), (-10.3128, -12))
            ThreePointArc((-10.3128, -12), (-9.0128, -10.7), (-10.3128, -9.4))
            Line((-10.3128, -9.4), (-11.8128, -9.4))
            ThreePointArc((-11.8128, -9.4), (-13.1128, -10.7), (-11.8128, -12))
        make_face()
    cut_extrude4_tool4 = extrude(cut_extrude4_sk4.sketch, amount=-CUT_EXTRUDE4_REACH, mode=Mode.PRIVATE) & part.part
    add(cut_extrude4_tool1.solids().sort_by_distance((0, -11.0628, 12))[0], mode=Mode.SUBTRACT)
    add(cut_extrude4_tool2.solids().sort_by_distance((0, 9.5134, 12))[0], mode=Mode.SUBTRACT)
    add(cut_extrude4_tool3.solids().sort_by_distance((0, 9.5134, -10.7))[0], mode=Mode.SUBTRACT)
    add(cut_extrude4_tool4.solids().sort_by_distance((0, -11.0628, -10.7))[0], mode=Mode.SUBTRACT)


solid = part.part
